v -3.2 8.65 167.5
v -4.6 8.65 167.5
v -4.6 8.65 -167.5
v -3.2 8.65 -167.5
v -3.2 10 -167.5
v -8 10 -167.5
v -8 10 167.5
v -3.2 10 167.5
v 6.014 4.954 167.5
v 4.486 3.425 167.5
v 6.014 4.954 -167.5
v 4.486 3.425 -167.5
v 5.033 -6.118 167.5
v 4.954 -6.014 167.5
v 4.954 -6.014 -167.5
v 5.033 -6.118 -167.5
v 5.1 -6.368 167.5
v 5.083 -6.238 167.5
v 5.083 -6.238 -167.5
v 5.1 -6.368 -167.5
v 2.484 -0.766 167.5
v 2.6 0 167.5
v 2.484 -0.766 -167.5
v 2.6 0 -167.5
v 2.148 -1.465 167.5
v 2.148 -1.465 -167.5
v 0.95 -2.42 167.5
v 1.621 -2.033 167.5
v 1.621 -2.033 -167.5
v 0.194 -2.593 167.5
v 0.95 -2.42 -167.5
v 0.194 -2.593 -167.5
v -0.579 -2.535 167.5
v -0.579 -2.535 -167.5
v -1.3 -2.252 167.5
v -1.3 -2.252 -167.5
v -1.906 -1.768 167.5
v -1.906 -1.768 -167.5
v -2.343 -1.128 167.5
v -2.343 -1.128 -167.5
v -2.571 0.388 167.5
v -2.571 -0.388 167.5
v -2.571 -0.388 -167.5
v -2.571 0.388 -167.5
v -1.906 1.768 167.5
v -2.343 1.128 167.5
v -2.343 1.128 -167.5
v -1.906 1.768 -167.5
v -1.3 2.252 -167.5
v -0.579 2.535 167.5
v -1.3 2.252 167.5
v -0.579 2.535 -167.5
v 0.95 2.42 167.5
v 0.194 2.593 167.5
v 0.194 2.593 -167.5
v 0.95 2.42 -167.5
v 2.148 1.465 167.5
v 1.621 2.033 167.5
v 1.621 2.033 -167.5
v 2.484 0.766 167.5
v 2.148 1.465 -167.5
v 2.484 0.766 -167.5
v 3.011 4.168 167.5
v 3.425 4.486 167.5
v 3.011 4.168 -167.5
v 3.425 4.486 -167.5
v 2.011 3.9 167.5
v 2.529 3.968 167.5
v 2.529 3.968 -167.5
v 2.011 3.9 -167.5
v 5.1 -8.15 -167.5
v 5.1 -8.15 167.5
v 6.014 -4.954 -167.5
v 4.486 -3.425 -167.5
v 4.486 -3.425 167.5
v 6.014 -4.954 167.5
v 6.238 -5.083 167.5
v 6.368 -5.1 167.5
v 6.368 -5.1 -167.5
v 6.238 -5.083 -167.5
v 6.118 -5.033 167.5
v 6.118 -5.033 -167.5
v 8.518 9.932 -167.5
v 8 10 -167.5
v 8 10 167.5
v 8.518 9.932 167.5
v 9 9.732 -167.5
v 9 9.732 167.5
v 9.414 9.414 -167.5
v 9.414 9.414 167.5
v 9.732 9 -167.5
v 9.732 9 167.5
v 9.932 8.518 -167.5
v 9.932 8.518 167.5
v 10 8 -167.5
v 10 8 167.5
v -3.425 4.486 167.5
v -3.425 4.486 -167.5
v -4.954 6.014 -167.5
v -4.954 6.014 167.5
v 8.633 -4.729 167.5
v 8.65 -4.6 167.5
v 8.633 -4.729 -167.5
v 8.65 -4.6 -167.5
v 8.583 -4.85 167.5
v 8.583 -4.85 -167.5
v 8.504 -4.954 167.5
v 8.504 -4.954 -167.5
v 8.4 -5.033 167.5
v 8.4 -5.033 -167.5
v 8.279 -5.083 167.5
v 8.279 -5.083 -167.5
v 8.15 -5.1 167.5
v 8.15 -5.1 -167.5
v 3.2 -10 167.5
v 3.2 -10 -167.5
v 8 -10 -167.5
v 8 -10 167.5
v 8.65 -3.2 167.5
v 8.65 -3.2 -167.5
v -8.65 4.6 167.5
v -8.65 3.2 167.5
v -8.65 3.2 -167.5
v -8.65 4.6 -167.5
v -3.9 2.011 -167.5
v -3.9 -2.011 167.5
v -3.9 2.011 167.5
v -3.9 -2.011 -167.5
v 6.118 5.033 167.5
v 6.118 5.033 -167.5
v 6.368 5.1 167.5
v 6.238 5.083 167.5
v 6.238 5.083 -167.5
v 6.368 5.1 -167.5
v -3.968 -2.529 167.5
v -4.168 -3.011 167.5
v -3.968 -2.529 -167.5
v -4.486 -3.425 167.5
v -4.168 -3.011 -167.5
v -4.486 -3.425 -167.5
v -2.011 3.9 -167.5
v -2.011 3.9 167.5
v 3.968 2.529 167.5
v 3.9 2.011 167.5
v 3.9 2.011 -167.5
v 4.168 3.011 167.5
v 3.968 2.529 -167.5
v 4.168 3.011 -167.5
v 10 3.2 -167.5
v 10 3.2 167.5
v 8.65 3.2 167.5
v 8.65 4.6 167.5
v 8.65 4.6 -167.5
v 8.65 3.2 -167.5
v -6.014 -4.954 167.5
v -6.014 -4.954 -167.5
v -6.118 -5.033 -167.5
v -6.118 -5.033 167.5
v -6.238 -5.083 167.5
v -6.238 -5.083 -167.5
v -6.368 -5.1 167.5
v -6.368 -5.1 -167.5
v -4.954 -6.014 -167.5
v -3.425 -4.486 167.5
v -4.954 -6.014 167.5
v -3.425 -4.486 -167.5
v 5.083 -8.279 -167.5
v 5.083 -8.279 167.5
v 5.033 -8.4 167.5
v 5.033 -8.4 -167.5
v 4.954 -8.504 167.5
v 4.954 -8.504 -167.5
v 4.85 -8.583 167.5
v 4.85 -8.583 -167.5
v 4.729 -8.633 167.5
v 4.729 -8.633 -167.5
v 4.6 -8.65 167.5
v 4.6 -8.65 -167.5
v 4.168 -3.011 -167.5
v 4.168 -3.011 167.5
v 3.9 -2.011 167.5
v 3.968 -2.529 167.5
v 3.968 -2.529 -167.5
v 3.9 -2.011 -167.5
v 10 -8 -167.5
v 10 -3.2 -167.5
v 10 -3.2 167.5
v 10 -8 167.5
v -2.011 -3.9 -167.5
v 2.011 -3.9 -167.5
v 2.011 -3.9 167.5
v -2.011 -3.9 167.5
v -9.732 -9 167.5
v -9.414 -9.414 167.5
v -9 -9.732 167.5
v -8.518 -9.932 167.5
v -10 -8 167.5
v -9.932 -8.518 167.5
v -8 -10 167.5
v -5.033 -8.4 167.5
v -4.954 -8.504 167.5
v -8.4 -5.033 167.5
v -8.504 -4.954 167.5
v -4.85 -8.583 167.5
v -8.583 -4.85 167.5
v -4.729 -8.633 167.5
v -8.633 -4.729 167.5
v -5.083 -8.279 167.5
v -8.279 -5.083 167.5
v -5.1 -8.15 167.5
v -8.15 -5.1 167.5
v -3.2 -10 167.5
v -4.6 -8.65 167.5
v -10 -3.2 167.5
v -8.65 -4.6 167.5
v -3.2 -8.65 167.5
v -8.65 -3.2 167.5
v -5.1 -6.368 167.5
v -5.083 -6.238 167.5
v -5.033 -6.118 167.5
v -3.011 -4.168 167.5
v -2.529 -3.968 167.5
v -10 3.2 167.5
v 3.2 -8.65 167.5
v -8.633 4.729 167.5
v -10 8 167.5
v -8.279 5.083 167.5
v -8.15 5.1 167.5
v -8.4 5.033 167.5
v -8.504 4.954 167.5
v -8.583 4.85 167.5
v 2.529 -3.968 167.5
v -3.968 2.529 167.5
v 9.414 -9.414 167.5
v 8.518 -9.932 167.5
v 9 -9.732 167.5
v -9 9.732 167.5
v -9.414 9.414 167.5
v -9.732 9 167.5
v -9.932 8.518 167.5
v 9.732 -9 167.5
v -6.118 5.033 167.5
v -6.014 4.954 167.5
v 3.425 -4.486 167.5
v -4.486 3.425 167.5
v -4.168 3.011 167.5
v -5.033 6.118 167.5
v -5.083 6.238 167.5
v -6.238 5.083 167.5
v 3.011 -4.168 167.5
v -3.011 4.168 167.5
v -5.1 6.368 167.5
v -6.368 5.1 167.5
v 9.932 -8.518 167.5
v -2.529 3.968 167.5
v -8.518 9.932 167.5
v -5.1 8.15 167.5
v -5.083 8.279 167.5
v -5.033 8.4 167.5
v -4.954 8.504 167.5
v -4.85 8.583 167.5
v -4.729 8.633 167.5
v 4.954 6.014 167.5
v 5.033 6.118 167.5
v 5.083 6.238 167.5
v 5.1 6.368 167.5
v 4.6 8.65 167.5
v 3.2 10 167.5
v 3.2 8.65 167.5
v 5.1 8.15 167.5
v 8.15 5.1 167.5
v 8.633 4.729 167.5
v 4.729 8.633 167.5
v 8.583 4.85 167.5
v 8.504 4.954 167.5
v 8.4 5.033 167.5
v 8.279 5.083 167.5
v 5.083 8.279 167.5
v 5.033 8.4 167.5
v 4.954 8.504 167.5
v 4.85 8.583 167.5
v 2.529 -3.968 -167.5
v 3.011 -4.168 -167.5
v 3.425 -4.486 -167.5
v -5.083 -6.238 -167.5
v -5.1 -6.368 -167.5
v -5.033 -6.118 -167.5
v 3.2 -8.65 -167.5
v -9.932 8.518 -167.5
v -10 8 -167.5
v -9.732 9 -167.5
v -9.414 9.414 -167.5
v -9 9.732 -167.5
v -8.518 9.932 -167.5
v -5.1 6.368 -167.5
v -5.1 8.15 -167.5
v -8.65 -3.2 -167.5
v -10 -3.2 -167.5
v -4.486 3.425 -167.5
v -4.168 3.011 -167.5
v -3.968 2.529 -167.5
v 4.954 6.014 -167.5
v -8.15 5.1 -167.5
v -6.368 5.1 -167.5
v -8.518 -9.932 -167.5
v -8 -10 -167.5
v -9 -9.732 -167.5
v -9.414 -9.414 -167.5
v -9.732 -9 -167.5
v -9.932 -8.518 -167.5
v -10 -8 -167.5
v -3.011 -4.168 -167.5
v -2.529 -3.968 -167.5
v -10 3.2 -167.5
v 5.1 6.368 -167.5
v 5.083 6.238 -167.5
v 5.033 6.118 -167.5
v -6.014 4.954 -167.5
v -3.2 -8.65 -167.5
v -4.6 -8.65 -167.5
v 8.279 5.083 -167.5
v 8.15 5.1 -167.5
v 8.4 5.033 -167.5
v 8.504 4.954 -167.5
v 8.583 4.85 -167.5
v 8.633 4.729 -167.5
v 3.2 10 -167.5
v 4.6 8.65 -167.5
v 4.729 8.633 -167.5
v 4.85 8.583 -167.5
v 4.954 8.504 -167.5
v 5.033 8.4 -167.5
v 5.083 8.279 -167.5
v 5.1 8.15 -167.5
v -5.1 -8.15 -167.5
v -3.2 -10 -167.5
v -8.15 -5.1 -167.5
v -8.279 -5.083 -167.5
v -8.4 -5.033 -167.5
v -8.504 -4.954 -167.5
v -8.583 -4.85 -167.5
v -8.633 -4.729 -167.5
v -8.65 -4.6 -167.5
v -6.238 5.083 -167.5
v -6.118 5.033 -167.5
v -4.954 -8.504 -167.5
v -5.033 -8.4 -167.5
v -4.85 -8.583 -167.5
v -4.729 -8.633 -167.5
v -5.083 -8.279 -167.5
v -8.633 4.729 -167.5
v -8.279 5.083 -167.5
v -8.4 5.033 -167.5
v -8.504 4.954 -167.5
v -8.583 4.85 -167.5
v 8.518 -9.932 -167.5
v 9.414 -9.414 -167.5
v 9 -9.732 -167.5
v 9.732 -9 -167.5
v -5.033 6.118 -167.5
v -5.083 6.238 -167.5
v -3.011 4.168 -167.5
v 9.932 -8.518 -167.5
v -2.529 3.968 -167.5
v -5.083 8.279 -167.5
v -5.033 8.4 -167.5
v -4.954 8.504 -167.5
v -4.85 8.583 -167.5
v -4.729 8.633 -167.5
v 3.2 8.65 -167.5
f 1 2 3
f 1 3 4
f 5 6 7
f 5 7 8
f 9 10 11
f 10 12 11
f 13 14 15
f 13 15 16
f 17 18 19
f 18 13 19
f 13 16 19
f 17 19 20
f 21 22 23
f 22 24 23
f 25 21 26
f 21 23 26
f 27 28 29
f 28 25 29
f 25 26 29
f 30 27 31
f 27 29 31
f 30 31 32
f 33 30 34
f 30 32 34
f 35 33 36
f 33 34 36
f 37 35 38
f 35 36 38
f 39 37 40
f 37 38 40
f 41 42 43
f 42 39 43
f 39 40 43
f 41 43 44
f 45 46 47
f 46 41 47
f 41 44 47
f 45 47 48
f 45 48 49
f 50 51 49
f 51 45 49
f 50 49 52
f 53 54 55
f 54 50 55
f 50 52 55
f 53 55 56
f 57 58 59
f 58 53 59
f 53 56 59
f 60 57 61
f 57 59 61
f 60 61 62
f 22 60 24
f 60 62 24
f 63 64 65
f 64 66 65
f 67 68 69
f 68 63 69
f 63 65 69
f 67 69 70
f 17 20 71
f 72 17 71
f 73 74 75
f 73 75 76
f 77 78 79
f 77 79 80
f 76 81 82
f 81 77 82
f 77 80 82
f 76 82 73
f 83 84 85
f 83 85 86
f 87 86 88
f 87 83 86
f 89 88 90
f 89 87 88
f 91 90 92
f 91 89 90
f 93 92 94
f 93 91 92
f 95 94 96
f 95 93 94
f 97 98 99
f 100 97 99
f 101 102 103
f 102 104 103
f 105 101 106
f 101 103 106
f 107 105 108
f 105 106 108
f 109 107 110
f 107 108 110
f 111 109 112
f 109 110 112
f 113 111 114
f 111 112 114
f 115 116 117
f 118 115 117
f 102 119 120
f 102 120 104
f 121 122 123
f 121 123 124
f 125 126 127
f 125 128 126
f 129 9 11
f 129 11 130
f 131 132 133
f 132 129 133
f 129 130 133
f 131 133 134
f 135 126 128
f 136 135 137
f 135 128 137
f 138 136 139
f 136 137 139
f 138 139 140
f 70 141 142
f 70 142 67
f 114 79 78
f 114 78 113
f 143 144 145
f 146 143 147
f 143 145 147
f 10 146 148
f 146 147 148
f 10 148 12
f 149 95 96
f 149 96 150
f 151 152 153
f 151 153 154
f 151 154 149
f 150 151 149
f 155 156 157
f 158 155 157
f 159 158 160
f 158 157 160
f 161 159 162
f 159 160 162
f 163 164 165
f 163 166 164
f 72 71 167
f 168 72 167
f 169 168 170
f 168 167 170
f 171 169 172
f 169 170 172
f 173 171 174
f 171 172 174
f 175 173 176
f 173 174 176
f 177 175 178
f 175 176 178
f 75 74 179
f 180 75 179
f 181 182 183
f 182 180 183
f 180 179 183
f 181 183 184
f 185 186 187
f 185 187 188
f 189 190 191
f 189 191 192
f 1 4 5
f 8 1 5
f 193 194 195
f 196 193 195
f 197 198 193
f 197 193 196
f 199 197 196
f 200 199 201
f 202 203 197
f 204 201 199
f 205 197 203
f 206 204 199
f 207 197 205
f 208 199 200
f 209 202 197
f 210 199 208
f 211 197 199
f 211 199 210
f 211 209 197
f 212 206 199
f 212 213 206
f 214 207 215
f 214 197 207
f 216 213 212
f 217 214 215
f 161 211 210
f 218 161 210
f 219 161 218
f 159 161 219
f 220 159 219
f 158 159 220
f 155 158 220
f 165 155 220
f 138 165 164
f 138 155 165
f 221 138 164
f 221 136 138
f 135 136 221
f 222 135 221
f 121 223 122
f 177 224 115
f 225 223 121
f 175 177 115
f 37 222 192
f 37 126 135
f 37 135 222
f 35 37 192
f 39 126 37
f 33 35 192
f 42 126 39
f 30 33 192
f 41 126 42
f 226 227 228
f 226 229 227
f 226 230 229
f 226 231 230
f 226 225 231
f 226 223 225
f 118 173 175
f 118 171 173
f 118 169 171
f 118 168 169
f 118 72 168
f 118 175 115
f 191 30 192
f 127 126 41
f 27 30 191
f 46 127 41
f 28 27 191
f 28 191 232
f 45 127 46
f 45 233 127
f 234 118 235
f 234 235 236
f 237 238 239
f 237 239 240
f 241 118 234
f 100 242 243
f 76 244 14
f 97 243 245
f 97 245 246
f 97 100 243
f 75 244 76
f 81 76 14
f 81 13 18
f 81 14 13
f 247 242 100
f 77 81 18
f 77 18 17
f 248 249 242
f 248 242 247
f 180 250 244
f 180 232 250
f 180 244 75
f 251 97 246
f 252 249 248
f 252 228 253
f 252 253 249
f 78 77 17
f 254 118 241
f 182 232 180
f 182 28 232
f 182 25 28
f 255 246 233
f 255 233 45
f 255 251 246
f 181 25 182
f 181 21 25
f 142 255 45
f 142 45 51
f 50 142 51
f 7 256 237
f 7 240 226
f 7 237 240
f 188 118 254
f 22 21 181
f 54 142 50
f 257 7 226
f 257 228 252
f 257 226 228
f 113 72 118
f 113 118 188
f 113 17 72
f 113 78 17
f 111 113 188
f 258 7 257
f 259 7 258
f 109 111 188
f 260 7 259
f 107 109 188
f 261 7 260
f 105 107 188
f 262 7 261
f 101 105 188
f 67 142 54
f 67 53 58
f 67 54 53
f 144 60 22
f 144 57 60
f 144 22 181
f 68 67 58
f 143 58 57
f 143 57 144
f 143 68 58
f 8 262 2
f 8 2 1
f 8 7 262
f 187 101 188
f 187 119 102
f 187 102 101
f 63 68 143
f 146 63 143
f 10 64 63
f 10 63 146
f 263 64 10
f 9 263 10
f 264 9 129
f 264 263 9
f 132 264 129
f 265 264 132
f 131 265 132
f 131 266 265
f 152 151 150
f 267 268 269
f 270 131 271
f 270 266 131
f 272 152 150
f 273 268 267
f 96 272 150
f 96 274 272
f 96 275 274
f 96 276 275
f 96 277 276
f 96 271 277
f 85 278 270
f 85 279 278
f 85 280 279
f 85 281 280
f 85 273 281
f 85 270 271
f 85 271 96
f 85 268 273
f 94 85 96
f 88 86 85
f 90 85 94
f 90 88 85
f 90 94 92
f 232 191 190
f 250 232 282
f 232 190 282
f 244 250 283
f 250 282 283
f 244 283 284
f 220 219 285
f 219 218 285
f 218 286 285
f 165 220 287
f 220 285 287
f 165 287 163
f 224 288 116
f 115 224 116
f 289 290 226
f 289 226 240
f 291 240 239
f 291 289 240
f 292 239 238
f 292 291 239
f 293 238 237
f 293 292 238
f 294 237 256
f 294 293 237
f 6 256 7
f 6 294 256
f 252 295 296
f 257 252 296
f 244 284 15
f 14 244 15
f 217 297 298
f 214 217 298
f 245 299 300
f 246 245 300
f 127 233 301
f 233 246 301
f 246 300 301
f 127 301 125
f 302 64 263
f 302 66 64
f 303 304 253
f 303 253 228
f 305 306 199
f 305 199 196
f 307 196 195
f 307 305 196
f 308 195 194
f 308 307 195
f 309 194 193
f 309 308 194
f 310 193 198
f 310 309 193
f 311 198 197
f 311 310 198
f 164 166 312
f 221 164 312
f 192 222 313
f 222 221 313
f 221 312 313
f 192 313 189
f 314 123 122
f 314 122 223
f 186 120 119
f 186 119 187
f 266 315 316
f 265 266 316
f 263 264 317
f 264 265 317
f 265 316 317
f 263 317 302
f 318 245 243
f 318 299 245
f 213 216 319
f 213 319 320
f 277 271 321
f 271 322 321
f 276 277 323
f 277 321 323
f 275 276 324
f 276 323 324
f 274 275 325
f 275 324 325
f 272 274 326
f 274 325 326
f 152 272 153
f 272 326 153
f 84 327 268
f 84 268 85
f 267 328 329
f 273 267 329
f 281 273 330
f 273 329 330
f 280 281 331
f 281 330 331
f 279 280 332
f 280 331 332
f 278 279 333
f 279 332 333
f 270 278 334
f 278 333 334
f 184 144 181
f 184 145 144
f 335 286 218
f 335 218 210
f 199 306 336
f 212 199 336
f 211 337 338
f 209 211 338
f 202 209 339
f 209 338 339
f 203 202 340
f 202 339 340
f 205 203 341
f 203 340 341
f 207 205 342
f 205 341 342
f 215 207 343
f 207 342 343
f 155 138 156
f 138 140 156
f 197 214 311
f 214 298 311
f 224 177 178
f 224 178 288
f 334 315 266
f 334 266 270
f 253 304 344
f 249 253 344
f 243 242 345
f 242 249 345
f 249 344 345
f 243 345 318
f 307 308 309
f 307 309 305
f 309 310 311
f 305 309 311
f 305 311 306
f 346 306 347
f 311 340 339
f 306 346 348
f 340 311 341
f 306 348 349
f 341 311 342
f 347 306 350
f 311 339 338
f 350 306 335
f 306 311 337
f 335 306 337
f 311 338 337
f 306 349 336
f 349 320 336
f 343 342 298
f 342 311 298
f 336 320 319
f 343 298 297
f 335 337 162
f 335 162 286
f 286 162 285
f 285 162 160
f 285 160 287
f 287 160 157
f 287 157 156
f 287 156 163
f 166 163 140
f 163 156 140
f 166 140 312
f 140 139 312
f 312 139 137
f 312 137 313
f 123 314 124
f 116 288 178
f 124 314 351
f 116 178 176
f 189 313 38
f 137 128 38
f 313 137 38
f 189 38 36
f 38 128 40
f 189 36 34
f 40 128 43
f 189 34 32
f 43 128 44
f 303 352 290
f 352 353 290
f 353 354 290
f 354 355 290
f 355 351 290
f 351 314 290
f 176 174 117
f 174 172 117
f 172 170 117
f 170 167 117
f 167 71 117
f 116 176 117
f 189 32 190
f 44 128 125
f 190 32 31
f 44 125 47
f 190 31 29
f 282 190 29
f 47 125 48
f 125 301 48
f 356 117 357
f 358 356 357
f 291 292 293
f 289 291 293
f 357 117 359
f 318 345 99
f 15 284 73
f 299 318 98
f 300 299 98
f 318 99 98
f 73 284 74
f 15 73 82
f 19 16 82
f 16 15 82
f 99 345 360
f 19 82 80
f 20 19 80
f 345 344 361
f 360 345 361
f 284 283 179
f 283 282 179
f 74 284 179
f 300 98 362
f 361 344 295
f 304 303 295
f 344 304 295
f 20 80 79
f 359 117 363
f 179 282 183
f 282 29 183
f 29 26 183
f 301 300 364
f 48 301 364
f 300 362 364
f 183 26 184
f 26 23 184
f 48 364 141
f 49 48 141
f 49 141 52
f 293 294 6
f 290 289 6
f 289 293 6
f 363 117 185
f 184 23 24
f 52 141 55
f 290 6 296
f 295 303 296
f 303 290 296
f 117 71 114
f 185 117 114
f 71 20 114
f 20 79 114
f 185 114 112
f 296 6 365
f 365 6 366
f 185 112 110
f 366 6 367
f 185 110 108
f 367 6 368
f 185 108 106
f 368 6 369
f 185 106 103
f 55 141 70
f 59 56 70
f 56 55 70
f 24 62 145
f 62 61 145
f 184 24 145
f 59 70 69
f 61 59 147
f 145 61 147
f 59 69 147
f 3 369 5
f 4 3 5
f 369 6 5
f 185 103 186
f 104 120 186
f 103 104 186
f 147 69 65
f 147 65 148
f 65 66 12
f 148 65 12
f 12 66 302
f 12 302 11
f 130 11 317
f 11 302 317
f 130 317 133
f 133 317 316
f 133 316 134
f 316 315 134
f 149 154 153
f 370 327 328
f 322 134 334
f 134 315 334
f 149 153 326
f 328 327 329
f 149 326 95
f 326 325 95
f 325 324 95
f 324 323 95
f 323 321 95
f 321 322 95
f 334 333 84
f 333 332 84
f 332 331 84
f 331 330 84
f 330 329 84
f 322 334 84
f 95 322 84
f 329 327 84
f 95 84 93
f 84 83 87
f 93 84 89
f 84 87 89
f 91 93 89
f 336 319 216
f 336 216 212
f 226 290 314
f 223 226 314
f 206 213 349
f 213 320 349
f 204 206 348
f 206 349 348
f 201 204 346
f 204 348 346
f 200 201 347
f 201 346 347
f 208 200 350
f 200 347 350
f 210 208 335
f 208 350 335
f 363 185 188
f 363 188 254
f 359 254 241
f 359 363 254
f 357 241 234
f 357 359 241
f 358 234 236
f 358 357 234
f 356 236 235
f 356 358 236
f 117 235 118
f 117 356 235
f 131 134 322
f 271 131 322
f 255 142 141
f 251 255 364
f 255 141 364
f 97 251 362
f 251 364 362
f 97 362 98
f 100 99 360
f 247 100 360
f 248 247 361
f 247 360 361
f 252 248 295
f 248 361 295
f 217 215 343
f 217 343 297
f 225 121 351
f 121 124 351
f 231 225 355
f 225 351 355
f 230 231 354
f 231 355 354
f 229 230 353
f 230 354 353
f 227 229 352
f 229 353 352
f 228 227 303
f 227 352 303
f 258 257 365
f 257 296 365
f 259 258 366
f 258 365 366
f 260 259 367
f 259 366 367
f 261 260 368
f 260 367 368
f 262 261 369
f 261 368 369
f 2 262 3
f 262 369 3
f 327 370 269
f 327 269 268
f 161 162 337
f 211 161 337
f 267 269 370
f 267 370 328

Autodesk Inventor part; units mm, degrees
ref_plane "YZ Plane" through (0, 0, 0) normal (1, 0, 0) x (0, 1, 0)
ref_plane "XZ Plane" through (0, 0, 0) normal (0, 1, 0) x (-1, 0, 0)
ref_plane "XY Plane" through (0, 0, 0) normal (0, 0, 1) x (1, 0, 0)
sketch "Sketch1" plane through (0, 0, 0) normal (0, 0, 1) x (1, 0, 0)
  line L0 (-8, -10) -> (-3.2, -10)
  arc A0 (-10, -8) -> (-8, -10) centre (-8, -8) ccw
  line L1 (3.2, -10) -> (8, -10)
  line L2 (-8, 10) -> (-3.2, 10)
  line L3 (3.2, 10) -> (8, 10)
  line L4 (-10, 8) -> (-10, 3.2)
  arc A1 (-8, 10) -> (-10, 8) centre (-8, 8) ccw
  line L5 (-10, -3.2) -> (-10, -8)
  line L6 (10, 8) -> (10, 3.2)
  arc A2 (10, 8) -> (8, 10) centre (8, 8) ccw
  line L7 (10, -3.2) -> (10, -8)
  arc A3 (8, -10) -> (10, -8) centre (8, -8) ccw
  circle A4 centre (0, 0) radius 2.6
  line L8 (8.65, 4.6) -> (8.65, 3.2)
  line L9 (8.65, -3.2) -> (8.65, -4.6)
  arc A5 (8.15, -5.1) -> (8.65, -4.6) centre (8.15, -4.6) ccw
  arc A6 (8.65, 4.6) -> (8.15, 5.1) centre (8.15, 4.6) ccw
  line L10 (3.9, 2.0109) -> (3.9, -2.0109)
  arc A7 (4.4858, 3.4251) -> (3.9, 2.0109) centre (5.9, 2.0109) ccw
  line L11 (8.65, 3.2) -> (10, 3.2)
  line L12 (8.65, -3.2) -> (10, -3.2)
  line L13 (6.3678, -5.1) -> (8.15, -5.1)
  arc A8 (6.0142, -4.9536) -> (6.3678, -5.1) centre (6.3678, -4.6) ccw
  line L14 (6.3678, 5.1) -> (8.15, 5.1)
  arc A9 (6.3678, 5.1) -> (6.0142, 4.9536) centre (6.3678, 4.6) ccw
  line L15 (4.4858, 3.4251) -> (6.0142, 4.9536)
  line L16 (4.4858, -3.4251) -> (6.0142, -4.9536)
  arc A10 (3.9, -2.0109) -> (4.4858, -3.4251) centre (5.9, -2.0109) ccw
  line L17 (-4.6, 8.65) -> (-3.2, 8.65)
  line L18 (3.2, 8.65) -> (4.6, 8.65)
  arc A11 (5.1, 8.15) -> (4.6, 8.65) centre (4.6, 8.15) ccw
  arc A12 (-4.6, 8.65) -> (-5.1, 8.15) centre (-4.6, 8.15) ccw
  line L19 (-2.0109, 3.9) -> (2.0109, 3.9)
  arc A13 (-3.4251, 4.4858) -> (-2.0109, 3.9) centre (-2.0109, 5.9) ccw
  line L20 (-3.2, 8.65) -> (-3.2, 10)
  line L21 (3.2, 8.65) -> (3.2, 10)
  line L22 (5.1, 6.3678) -> (5.1, 8.15)
  arc A14 (4.9536, 6.0142) -> (5.1, 6.3678) centre (4.6, 6.3678) ccw
  line L23 (-5.1, 6.3678) -> (-5.1, 8.15)
  arc A15 (-5.1, 6.3678) -> (-4.9536, 6.0142) centre (-4.6, 6.3678) ccw
  line L24 (-3.4251, 4.4858) -> (-4.9536, 6.0142)
  line L25 (3.4251, 4.4858) -> (4.9536, 6.0142)
  arc A16 (2.0109, 3.9) -> (3.4251, 4.4858) centre (2.0109, 5.9) ccw
  line L26 (-8.65, -4.6) -> (-8.65, -3.2)
  line L27 (-8.65, 3.2) -> (-8.65, 4.6)
  arc A17 (-8.15, 5.1) -> (-8.65, 4.6) centre (-8.15, 4.6) ccw
  arc A18 (-8.65, -4.6) -> (-8.15, -5.1) centre (-8.15, -4.6) ccw
  line L28 (-3.9, -2.0109) -> (-3.9, 2.0109)
  arc A19 (-4.4858, -3.4251) -> (-3.9, -2.0109) centre (-5.9, -2.0109) ccw
  line L29 (-8.65, -3.2) -> (-10, -3.2)
  line L30 (-8.65, 3.2) -> (-10, 3.2)
  line L31 (-6.3678, 5.1) -> (-8.15, 5.1)
  arc A20 (-6.0142, 4.9536) -> (-6.3678, 5.1) centre (-6.3678, 4.6) ccw
  line L32 (-6.3678, -5.1) -> (-8.15, -5.1)
  arc A21 (-6.3678, -5.1) -> (-6.0142, -4.9536) centre (-6.3678, -4.6) ccw
  line L33 (-4.4858, -3.4251) -> (-6.0142, -4.9536)
  line L34 (-4.4858, 3.4251) -> (-6.0142, 4.9536)
  arc A22 (-3.9, 2.0109) -> (-4.4858, 3.4251) centre (-5.9, 2.0109) ccw
  line L35 (4.6, -8.65) -> (3.2, -8.65)
  line L36 (-3.2, -8.65) -> (-4.6, -8.65)
  arc A23 (-5.1, -8.15) -> (-4.6, -8.65) centre (-4.6, -8.15) ccw
  arc A24 (4.6, -8.65) -> (5.1, -8.15) centre (4.6, -8.15) ccw
  line L37 (2.0109, -3.9) -> (-2.0109, -3.9)
  arc A25 (3.4251, -4.4858) -> (2.0109, -3.9) centre (2.0109, -5.9) ccw
  line L38 (3.2, -8.65) -> (3.2, -10)
  line L39 (-3.2, -8.65) -> (-3.2, -10)
  line L40 (-5.1, -6.3678) -> (-5.1, -8.15)
  arc A26 (-4.9536, -6.0142) -> (-5.1, -6.3678) centre (-4.6, -6.3678) ccw
  line L41 (5.1, -6.3678) -> (5.1, -8.15)
  arc A27 (5.1, -6.3678) -> (4.9536, -6.0142) centre (4.6, -6.3678) ccw
  line L42 (3.4251, -4.4858) -> (4.9536, -6.0142)
  line L43 (-3.4251, -4.4858) -> (-4.9536, -6.0142)
  arc A28 (-2.0109, -3.9) -> (-3.4251, -4.4858) centre (-2.0109, -5.9) ccw
  dimension "d0" = 0.5
  dimension "d1" = 2
  dimension "d2" = 5.2
  dimension "d3" = 45
  dimension "d4" = 45
  dimension "d5" = 45
  dimension "d6" = 90
  dimension "d7" = 90
  dimension "d8" = 45
  dimension "d9" = 45
  dimension "d10" = 90
  dimension "d11" = 90
  dimension "d12" = 90
  dimension "d13" = 90
  dimension "d14" = 90
  dimension "d15" = 90
  dimension "d16" = 90
  dimension "d17" = 90
  dimension "d18" = 90
  dimension "d19" = 90
  dimension "d20" = 90
  dimension "d21" = 90
  dimension "d22" = 90
  dimension "d23" = 90
  dimension "d24" = 1.35
  dimension "d25" = 4.9
  dimension "d26" = 6.1
  dimension "d27" = 6.8
  dimension "d28" = 13.2
  dimension "d29" = 13.9
  dimension "d30" = 15.1
  dimension "d31" = 18.65
  dimension "d32" = 20
  dimension "d33" = 6.4
  dimension "d34" = 1.9
  dimension "d35" = 8.3
  dimension "d36" = 6.8
  dimension "d37" = 13.2
  dimension "d38" = 5.45
  dimension "d39" = 11.85
  dimension "d40" = 0.7
  dimension "d41" = 7.1
  dimension "d42" = 1.5
  dimension "d43" = 1.5
  dimension "d44" = 10
  dimension "d45" = 10
  dimension "d46" = 3.2
  dimension "d47" = 8.65
  dimension "d48" = 0.75
  dimension "d49" = 0.75
  dimension "d50" = 5.1
  dimension "d51" = 0.75
  dimension "d52" = 3.2
  dimension "d53" = 3.2
  dimension "d54" = 8.65
  dimension "d55" = 8.65
  dimension "d56" = 0.75
  dimension "d57" = 0.75
  dimension "d58" = 5.1
  dimension "d59" = 0.75
  dimension "d60" = 10
  dimension "d61" = 10
  dimension "d62" = 5.1
  dimension "d63" = 5.1
extrude "Extrusion1" add sketch "Sketch1" along normal mid plane 335
equation "\"platform_width\" = 214"
equation "\"platform_depth\" = 214"
equation "\"bed_cl_y_offset\" = 173.25"
properties part number "2020 Extrusion - Double Z motor - Bed X" material "Aluminum 6061"
